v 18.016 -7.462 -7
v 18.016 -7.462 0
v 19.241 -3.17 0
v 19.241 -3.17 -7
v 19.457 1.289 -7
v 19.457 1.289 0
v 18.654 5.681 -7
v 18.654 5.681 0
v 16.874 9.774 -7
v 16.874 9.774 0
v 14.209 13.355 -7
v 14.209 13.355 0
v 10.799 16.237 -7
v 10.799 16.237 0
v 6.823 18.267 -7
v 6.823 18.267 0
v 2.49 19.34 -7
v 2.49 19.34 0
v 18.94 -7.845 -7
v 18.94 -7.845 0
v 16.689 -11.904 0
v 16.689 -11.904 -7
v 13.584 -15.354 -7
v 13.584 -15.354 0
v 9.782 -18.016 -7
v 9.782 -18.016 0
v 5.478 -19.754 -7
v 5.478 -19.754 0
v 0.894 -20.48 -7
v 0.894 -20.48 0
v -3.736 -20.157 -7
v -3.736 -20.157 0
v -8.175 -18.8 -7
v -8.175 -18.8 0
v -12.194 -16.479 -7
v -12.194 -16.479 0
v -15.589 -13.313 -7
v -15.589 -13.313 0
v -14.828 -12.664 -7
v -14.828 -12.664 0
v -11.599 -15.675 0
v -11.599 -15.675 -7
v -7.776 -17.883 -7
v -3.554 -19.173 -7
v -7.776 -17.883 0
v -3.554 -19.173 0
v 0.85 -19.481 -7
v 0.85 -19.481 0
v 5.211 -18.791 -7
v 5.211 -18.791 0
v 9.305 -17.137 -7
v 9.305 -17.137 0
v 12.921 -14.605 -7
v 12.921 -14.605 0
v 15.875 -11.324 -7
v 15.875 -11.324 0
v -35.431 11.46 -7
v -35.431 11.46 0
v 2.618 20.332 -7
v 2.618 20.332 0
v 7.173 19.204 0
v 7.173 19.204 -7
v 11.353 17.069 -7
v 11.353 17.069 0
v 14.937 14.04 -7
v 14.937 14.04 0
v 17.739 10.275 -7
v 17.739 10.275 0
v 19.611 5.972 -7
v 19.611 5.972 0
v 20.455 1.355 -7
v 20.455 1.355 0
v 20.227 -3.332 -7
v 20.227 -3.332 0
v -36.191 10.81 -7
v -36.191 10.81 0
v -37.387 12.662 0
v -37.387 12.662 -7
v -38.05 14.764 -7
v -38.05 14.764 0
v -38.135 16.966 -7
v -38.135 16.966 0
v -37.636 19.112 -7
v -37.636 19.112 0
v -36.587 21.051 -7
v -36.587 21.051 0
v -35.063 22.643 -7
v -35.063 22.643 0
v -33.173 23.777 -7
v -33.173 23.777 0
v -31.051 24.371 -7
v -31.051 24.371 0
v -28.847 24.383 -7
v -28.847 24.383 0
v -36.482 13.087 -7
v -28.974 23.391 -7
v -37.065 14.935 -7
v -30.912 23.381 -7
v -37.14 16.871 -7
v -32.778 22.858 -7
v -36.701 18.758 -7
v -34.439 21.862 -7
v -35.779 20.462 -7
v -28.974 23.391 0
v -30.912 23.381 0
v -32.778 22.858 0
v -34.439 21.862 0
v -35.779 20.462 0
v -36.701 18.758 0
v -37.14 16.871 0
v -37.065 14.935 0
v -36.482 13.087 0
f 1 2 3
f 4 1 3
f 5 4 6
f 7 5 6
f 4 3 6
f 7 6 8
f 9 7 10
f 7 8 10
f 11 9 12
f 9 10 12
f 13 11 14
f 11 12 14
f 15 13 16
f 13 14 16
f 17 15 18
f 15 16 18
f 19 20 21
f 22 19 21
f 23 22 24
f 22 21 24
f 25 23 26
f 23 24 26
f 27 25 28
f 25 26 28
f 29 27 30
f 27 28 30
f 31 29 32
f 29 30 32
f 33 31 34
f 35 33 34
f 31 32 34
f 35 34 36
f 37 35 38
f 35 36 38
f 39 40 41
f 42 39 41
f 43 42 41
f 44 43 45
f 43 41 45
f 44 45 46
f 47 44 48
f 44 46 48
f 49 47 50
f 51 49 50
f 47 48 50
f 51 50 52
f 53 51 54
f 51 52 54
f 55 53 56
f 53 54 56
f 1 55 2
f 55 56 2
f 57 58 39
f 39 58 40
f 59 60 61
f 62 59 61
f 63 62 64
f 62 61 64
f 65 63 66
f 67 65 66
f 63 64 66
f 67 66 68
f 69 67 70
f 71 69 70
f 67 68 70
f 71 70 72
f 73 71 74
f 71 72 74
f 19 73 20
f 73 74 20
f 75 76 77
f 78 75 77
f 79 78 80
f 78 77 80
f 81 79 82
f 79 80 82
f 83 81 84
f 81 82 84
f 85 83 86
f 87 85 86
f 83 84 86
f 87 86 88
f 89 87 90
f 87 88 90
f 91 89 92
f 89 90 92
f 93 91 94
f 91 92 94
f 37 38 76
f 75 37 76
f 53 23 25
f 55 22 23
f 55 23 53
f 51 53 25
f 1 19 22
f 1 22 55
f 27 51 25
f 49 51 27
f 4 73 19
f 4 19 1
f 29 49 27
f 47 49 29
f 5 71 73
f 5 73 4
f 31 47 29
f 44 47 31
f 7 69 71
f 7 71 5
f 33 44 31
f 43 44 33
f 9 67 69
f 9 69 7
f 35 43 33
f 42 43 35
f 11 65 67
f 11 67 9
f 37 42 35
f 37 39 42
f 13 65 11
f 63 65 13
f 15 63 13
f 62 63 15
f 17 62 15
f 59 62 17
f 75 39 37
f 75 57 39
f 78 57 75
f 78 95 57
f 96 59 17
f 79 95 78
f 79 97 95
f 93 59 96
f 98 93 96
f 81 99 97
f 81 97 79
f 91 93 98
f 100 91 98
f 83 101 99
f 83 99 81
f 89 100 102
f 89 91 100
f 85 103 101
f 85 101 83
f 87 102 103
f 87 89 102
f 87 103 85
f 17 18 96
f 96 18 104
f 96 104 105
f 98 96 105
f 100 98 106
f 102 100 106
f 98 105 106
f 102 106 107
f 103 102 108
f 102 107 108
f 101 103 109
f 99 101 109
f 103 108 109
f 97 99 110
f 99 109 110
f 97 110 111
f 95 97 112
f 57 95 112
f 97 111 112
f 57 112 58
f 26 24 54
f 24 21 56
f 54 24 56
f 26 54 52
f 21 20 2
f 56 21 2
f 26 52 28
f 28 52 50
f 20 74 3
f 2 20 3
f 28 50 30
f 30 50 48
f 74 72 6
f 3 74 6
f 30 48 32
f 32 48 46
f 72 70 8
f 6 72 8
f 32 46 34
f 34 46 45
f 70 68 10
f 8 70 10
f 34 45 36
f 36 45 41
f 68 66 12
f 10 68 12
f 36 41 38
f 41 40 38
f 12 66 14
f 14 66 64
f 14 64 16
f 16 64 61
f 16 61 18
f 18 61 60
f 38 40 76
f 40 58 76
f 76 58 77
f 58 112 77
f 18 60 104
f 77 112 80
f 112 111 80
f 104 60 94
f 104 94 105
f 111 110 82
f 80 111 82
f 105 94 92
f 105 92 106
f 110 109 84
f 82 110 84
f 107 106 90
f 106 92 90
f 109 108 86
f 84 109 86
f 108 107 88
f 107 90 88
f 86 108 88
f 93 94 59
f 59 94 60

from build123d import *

# Parameters (mm, degrees)
BOSS_EXTRUDE1_DEPTH = 7


with BuildPart() as part:
    # Sketch1 → Boss-Extrude1 (new body)
    with BuildSketch(Plane.XY):
        with BuildLine():
            Line((-28.84670785, 24.383284156), (2.617804957, 20.332169024))
            ThreePointArc((2.617804957, 20.332169024), (17.738884876, 10.27530843), (18.939530416, -7.845010363))
            ThreePointArc((18.939530416, -7.845010363), (3.206757045, -20.247634658), (-15.588518883, -13.313454812))
            Line((-15.588518883, -13.313454812), (-36.191405321, 10.810147126))
            ThreePointArc((-36.191405321, 10.810147126), (-37.176177413, 20.116777399), (-28.84670785, 24.383284156))
        make_face()
        with BuildLine():
            ThreePointArc((-28.974405652, 23.391471033), (-36.296684217, 19.64086594), (-35.430989766, 11.459583946))
            Line((-35.430989766, 11.459583946), (-14.828103328, -12.664017991))
            ThreePointArc((-14.828103328, -12.664017991), (3.050329872, -19.259945163), (18.015650884, -7.462326931))
            ThreePointArc((18.015650884, -7.462326931), (16.873573419, 9.774073873), (2.490107155, 19.340355901))
            Line((2.490107155, 19.340355901), (-28.974405652, 23.391471033))
        make_face(mode=Mode.SUBTRACT)
    extrude(amount=-BOSS_EXTRUDE1_DEPTH)


solid = part.part
